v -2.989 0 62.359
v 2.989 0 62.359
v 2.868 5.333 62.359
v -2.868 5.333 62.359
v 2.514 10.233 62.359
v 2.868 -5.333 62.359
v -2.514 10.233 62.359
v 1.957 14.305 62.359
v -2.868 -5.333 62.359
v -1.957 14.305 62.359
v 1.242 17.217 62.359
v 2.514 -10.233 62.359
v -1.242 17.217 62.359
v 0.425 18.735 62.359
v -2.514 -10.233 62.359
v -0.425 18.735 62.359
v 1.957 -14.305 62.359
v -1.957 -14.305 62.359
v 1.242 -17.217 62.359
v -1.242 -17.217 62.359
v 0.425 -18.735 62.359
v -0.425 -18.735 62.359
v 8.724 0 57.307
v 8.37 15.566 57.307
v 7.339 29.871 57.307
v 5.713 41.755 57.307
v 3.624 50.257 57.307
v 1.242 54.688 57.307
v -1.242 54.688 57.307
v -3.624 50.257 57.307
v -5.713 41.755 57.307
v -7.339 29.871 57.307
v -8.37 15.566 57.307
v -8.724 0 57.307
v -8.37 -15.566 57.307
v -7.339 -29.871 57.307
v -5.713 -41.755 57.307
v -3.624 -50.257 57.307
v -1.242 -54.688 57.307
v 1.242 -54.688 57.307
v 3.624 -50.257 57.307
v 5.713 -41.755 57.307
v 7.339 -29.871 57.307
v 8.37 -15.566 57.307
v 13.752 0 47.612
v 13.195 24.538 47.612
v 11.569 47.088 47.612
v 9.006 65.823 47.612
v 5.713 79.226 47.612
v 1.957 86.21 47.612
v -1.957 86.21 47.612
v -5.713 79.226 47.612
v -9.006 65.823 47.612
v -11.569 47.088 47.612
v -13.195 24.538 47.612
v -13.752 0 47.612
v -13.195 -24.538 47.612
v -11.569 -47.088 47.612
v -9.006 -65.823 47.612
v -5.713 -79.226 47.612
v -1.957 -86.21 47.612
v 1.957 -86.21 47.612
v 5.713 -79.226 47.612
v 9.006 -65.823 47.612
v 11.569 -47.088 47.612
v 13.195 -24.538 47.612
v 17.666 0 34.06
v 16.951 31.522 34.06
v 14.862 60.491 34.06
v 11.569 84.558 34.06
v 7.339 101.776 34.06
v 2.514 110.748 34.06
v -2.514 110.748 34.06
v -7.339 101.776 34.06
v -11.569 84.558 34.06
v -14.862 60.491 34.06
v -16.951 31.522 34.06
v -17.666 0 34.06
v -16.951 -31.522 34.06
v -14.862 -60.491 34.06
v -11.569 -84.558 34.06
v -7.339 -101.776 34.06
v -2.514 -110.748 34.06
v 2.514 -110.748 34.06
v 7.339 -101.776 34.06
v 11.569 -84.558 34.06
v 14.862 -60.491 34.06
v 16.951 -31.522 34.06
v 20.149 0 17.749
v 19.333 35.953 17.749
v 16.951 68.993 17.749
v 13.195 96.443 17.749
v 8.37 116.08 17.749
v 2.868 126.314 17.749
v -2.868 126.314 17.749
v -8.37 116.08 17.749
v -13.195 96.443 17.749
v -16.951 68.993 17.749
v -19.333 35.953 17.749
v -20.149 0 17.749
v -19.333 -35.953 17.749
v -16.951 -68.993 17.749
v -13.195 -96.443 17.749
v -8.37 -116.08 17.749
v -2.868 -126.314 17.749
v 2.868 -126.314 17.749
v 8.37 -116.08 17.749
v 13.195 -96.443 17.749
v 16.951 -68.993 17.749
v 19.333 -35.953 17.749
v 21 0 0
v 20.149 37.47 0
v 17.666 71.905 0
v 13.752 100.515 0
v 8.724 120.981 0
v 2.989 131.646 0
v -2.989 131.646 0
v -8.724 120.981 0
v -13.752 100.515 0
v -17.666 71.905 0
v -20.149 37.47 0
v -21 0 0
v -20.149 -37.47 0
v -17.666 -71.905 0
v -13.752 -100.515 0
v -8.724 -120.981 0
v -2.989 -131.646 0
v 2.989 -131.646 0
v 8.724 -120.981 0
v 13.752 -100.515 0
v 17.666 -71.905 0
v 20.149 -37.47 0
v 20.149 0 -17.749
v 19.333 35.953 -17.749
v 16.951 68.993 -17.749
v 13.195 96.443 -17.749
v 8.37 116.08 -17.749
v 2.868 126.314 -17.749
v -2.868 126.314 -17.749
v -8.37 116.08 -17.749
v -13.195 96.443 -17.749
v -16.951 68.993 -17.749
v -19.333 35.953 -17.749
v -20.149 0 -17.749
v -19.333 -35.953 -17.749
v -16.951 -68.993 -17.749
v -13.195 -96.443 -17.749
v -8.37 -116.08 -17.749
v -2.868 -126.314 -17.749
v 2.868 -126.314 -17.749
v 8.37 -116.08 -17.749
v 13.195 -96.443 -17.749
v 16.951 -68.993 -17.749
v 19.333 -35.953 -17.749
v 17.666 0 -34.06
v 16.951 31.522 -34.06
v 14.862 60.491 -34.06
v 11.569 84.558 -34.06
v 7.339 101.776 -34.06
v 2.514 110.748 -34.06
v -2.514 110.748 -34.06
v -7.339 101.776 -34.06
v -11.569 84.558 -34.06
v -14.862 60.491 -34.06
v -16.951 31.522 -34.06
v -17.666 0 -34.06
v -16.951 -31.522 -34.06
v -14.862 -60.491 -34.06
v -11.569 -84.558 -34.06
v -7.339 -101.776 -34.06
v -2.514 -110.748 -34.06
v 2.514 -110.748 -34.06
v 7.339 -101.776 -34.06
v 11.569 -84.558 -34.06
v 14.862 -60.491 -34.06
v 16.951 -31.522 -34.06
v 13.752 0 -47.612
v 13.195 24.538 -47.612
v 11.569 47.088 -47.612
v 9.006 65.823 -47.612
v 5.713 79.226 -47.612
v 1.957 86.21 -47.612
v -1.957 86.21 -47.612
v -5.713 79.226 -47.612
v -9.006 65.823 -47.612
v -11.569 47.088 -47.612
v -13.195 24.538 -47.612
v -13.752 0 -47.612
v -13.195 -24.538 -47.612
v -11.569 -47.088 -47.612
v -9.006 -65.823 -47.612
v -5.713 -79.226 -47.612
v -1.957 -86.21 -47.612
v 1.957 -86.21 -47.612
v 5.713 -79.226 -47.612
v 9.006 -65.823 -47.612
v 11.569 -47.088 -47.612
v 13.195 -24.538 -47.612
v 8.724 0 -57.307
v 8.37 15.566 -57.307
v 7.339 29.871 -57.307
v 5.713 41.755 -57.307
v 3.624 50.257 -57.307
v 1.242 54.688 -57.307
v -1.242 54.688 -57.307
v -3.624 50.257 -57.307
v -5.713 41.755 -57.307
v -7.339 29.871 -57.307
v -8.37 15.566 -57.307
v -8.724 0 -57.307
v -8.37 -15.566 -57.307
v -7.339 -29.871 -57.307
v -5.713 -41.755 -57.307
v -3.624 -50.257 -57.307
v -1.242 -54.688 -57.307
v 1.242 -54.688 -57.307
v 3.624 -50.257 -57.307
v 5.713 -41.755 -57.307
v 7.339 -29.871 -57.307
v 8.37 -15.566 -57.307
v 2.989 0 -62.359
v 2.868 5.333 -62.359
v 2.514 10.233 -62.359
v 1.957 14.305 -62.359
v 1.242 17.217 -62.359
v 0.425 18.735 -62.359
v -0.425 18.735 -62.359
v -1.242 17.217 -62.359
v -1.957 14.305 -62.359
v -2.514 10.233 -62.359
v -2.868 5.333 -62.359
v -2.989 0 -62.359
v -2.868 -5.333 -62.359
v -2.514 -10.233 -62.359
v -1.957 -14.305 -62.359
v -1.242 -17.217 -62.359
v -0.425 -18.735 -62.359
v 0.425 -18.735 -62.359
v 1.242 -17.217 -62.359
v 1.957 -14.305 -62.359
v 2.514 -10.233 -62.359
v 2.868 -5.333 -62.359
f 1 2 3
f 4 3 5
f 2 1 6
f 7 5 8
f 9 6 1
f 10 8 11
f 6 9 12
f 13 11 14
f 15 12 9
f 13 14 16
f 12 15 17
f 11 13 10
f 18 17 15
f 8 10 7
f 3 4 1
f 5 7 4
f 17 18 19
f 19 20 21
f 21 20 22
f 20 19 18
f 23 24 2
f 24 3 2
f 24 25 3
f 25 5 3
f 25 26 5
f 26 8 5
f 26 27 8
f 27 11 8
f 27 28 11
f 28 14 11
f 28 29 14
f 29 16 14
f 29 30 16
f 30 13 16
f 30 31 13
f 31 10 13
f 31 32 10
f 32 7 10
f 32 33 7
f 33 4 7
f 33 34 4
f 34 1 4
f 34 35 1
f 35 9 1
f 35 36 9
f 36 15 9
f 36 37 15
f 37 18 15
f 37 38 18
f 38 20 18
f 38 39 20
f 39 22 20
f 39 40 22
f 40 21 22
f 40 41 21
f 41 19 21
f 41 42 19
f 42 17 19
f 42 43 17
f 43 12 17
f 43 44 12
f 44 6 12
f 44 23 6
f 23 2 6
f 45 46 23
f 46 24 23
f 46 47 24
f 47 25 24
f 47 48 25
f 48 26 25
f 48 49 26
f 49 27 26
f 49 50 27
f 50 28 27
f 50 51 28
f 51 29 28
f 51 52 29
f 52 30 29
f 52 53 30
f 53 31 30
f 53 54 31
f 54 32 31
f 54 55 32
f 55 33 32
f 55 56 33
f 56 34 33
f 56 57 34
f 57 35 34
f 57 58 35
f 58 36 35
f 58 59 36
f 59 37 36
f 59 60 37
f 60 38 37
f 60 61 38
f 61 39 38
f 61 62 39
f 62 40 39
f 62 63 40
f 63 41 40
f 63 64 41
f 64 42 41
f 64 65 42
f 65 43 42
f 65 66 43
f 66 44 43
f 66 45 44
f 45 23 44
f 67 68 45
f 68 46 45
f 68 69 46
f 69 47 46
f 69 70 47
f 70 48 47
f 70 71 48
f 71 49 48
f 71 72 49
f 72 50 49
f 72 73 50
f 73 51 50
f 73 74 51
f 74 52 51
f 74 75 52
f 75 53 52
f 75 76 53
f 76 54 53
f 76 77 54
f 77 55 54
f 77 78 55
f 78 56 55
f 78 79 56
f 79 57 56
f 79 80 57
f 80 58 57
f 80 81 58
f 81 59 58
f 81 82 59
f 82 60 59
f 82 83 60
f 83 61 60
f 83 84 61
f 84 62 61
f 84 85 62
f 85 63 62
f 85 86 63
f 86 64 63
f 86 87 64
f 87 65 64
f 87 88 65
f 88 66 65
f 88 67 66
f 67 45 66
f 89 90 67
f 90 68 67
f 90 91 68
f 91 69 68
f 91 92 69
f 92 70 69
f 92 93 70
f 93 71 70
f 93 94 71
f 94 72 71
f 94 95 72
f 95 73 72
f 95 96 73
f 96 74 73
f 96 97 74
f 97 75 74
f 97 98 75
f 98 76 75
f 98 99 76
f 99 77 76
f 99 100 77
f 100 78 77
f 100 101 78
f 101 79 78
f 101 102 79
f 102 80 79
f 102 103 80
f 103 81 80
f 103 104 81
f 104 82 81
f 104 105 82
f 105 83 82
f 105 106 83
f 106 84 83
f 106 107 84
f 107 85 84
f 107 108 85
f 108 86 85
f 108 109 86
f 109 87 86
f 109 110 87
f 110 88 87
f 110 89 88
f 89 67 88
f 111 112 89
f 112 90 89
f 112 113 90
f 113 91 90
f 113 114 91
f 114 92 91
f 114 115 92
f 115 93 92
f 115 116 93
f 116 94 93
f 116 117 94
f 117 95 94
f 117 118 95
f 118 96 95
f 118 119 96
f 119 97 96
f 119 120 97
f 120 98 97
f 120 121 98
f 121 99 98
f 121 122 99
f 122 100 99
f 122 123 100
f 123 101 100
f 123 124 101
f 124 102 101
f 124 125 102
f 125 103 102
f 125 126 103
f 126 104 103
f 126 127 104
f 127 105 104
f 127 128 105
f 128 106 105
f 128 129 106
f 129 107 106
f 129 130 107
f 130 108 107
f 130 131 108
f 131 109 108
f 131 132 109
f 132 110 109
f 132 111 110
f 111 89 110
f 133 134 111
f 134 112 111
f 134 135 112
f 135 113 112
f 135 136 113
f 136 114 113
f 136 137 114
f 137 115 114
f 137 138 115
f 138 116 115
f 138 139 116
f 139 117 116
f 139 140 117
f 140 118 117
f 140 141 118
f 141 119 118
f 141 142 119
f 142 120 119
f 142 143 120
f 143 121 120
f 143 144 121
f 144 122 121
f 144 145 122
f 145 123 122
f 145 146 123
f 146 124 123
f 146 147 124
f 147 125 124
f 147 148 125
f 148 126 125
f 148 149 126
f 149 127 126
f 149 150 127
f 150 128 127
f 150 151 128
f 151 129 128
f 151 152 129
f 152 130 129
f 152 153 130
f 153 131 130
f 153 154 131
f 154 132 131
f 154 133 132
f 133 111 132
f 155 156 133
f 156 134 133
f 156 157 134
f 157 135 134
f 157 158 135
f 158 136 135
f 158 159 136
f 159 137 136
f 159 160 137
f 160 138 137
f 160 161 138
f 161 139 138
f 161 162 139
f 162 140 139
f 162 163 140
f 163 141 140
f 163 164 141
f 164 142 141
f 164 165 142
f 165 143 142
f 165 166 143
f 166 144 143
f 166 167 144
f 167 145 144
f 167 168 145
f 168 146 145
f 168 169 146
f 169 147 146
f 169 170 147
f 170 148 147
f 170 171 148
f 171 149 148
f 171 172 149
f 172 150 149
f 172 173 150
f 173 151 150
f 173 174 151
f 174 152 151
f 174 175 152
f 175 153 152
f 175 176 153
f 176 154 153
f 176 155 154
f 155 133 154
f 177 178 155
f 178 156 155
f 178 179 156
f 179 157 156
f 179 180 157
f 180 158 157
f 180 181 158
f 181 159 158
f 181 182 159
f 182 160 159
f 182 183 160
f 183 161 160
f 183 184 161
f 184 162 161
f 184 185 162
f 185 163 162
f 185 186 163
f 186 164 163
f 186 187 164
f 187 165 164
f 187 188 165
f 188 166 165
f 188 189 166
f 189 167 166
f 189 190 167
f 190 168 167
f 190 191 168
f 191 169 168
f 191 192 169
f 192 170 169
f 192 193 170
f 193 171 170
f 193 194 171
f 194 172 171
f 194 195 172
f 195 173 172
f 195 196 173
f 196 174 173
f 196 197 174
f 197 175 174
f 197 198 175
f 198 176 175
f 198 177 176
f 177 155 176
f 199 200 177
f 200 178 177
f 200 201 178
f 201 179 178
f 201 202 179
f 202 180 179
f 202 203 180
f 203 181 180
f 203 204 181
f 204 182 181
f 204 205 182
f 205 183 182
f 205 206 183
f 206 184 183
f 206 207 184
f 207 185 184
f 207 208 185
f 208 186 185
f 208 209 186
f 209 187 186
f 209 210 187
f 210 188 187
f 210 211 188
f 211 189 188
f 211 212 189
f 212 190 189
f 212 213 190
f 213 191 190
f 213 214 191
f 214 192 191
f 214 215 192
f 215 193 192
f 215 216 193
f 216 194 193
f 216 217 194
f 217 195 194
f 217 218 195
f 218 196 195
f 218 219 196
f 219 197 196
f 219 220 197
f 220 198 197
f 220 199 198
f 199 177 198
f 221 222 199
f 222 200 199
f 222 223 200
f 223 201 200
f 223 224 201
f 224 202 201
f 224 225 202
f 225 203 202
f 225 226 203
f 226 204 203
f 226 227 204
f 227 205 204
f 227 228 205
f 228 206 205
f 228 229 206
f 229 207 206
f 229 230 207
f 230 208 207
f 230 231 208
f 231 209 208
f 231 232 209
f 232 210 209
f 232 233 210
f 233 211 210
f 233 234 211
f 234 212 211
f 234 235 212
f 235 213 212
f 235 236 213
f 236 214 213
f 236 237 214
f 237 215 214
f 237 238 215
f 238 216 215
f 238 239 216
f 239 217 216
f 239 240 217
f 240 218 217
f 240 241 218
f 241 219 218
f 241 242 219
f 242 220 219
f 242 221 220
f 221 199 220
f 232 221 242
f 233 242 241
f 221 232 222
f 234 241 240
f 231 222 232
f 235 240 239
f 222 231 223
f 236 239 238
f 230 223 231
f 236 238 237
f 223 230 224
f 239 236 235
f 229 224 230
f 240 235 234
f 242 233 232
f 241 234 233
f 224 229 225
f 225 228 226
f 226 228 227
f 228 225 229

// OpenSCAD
// Generated by SolidPython 1.0.1 on 2020-07-29 00:46:46


scale(v = [3, 19, 9]) {
	sphere(r = 7);
}
/***********************************************
*********      SolidPython code:      **********
************************************************
 
# import packages: SolidPython
from solid import *
from solid.utils import *
from itertools import chain, combinations, permutations


class Resize:

    def __init__(self, scad_file):
        self.scad_file = scad_file
        #self.scad_file = import_scad(scad_file)
        # cone/cylinder param:
        self.r1 = 0
        self.r2 = 0
        self.h = 0
        # rectangular prism param:
        self.w = 0
        self.l = 0
        # ellipse param:
        self.r = 0

    # import OpenScad code (file name corresponds to shape)


    # classify shape + parameters
    def assign(self, param1, param2, param3):
        if self.scad_file == 'cone.scad':
            self.r1 = param1
            self.r2 = param2
            self.h = param3
        elif self.scad_file == 'cylinder.scad':
            self.r1 = param1
            self.r2 = param2
            self.h = param3
        elif self.scad_file == 'rectangularPrism.scad':
            self.h = param1
            self.l = param2
            self.w = param3
        else:
            self.r = param1
            self.h = param2

    # resize parameters
    def iterate(self):
        x = range(3, 20, 2)
        i = 1
        if self.scad_file == 'cone.scad':
            tempList = list(permutations(x, 2))
            for temp in tempList:
                param1 = temp[0]
                param2 = temp[1]
                filepath = 'produced_scad_files/' + 'cone' + str(param1) + '_' + str(param2) + '_' + '.scad'
                scad_render_to_file(cylinder(h=param1, r1=param2, r2=0), filepath)

        elif self.scad_file == 'cylinder.scad':
            tempList = list(permutations(x, 3))
            for temp in tempList:
                param1 = temp[0]
                param2 = temp[1]
                filepath = 'produced_scad_files/' + 'cylinder' + str(param1) + '_' + str(param2) + '_' + '.scad'
                scad_render_to_file(cylinder(h=param1, r1=param2, r2=param2), filepath)

        elif self.scad_file == 'rectangularPrism.scad':
            tempList = list(permutations(x, 3))
            for temp in tempList:
                param1 = temp[0]
                param2 = temp[1]
                param3 = temp[2]
                filepath = 'produced_scad_files/' + 'rectangularPrism' + str(param1) + '_' + str(param2) + '_' + str(
                    param3) + '.scad'
                scad_render_to_file(cube(size=(param1, param2, param3)), filepath)

        elif self.scad_file == 'ellipse.scad':
            tempList = list(permutations(x, 4))
            for temp in tempList:
                param1 = temp[0]
                param2 = temp[1]
                param3 = temp[2]
                param4 = temp[3]
                filepath = 'produced_scad_files/' + 'ellipse' + str(param1) + '_' + str(param2) + '_' + str(param3) + '_' + str(param4) + '.scad'
                scad_render_to_file(scale([param1, param2, param3])(sphere(r=param4)), filepath)

    def render_to_scadfile(self):
        scad_render_to_file(scad, 'example.scad') 
 
************************************************/
